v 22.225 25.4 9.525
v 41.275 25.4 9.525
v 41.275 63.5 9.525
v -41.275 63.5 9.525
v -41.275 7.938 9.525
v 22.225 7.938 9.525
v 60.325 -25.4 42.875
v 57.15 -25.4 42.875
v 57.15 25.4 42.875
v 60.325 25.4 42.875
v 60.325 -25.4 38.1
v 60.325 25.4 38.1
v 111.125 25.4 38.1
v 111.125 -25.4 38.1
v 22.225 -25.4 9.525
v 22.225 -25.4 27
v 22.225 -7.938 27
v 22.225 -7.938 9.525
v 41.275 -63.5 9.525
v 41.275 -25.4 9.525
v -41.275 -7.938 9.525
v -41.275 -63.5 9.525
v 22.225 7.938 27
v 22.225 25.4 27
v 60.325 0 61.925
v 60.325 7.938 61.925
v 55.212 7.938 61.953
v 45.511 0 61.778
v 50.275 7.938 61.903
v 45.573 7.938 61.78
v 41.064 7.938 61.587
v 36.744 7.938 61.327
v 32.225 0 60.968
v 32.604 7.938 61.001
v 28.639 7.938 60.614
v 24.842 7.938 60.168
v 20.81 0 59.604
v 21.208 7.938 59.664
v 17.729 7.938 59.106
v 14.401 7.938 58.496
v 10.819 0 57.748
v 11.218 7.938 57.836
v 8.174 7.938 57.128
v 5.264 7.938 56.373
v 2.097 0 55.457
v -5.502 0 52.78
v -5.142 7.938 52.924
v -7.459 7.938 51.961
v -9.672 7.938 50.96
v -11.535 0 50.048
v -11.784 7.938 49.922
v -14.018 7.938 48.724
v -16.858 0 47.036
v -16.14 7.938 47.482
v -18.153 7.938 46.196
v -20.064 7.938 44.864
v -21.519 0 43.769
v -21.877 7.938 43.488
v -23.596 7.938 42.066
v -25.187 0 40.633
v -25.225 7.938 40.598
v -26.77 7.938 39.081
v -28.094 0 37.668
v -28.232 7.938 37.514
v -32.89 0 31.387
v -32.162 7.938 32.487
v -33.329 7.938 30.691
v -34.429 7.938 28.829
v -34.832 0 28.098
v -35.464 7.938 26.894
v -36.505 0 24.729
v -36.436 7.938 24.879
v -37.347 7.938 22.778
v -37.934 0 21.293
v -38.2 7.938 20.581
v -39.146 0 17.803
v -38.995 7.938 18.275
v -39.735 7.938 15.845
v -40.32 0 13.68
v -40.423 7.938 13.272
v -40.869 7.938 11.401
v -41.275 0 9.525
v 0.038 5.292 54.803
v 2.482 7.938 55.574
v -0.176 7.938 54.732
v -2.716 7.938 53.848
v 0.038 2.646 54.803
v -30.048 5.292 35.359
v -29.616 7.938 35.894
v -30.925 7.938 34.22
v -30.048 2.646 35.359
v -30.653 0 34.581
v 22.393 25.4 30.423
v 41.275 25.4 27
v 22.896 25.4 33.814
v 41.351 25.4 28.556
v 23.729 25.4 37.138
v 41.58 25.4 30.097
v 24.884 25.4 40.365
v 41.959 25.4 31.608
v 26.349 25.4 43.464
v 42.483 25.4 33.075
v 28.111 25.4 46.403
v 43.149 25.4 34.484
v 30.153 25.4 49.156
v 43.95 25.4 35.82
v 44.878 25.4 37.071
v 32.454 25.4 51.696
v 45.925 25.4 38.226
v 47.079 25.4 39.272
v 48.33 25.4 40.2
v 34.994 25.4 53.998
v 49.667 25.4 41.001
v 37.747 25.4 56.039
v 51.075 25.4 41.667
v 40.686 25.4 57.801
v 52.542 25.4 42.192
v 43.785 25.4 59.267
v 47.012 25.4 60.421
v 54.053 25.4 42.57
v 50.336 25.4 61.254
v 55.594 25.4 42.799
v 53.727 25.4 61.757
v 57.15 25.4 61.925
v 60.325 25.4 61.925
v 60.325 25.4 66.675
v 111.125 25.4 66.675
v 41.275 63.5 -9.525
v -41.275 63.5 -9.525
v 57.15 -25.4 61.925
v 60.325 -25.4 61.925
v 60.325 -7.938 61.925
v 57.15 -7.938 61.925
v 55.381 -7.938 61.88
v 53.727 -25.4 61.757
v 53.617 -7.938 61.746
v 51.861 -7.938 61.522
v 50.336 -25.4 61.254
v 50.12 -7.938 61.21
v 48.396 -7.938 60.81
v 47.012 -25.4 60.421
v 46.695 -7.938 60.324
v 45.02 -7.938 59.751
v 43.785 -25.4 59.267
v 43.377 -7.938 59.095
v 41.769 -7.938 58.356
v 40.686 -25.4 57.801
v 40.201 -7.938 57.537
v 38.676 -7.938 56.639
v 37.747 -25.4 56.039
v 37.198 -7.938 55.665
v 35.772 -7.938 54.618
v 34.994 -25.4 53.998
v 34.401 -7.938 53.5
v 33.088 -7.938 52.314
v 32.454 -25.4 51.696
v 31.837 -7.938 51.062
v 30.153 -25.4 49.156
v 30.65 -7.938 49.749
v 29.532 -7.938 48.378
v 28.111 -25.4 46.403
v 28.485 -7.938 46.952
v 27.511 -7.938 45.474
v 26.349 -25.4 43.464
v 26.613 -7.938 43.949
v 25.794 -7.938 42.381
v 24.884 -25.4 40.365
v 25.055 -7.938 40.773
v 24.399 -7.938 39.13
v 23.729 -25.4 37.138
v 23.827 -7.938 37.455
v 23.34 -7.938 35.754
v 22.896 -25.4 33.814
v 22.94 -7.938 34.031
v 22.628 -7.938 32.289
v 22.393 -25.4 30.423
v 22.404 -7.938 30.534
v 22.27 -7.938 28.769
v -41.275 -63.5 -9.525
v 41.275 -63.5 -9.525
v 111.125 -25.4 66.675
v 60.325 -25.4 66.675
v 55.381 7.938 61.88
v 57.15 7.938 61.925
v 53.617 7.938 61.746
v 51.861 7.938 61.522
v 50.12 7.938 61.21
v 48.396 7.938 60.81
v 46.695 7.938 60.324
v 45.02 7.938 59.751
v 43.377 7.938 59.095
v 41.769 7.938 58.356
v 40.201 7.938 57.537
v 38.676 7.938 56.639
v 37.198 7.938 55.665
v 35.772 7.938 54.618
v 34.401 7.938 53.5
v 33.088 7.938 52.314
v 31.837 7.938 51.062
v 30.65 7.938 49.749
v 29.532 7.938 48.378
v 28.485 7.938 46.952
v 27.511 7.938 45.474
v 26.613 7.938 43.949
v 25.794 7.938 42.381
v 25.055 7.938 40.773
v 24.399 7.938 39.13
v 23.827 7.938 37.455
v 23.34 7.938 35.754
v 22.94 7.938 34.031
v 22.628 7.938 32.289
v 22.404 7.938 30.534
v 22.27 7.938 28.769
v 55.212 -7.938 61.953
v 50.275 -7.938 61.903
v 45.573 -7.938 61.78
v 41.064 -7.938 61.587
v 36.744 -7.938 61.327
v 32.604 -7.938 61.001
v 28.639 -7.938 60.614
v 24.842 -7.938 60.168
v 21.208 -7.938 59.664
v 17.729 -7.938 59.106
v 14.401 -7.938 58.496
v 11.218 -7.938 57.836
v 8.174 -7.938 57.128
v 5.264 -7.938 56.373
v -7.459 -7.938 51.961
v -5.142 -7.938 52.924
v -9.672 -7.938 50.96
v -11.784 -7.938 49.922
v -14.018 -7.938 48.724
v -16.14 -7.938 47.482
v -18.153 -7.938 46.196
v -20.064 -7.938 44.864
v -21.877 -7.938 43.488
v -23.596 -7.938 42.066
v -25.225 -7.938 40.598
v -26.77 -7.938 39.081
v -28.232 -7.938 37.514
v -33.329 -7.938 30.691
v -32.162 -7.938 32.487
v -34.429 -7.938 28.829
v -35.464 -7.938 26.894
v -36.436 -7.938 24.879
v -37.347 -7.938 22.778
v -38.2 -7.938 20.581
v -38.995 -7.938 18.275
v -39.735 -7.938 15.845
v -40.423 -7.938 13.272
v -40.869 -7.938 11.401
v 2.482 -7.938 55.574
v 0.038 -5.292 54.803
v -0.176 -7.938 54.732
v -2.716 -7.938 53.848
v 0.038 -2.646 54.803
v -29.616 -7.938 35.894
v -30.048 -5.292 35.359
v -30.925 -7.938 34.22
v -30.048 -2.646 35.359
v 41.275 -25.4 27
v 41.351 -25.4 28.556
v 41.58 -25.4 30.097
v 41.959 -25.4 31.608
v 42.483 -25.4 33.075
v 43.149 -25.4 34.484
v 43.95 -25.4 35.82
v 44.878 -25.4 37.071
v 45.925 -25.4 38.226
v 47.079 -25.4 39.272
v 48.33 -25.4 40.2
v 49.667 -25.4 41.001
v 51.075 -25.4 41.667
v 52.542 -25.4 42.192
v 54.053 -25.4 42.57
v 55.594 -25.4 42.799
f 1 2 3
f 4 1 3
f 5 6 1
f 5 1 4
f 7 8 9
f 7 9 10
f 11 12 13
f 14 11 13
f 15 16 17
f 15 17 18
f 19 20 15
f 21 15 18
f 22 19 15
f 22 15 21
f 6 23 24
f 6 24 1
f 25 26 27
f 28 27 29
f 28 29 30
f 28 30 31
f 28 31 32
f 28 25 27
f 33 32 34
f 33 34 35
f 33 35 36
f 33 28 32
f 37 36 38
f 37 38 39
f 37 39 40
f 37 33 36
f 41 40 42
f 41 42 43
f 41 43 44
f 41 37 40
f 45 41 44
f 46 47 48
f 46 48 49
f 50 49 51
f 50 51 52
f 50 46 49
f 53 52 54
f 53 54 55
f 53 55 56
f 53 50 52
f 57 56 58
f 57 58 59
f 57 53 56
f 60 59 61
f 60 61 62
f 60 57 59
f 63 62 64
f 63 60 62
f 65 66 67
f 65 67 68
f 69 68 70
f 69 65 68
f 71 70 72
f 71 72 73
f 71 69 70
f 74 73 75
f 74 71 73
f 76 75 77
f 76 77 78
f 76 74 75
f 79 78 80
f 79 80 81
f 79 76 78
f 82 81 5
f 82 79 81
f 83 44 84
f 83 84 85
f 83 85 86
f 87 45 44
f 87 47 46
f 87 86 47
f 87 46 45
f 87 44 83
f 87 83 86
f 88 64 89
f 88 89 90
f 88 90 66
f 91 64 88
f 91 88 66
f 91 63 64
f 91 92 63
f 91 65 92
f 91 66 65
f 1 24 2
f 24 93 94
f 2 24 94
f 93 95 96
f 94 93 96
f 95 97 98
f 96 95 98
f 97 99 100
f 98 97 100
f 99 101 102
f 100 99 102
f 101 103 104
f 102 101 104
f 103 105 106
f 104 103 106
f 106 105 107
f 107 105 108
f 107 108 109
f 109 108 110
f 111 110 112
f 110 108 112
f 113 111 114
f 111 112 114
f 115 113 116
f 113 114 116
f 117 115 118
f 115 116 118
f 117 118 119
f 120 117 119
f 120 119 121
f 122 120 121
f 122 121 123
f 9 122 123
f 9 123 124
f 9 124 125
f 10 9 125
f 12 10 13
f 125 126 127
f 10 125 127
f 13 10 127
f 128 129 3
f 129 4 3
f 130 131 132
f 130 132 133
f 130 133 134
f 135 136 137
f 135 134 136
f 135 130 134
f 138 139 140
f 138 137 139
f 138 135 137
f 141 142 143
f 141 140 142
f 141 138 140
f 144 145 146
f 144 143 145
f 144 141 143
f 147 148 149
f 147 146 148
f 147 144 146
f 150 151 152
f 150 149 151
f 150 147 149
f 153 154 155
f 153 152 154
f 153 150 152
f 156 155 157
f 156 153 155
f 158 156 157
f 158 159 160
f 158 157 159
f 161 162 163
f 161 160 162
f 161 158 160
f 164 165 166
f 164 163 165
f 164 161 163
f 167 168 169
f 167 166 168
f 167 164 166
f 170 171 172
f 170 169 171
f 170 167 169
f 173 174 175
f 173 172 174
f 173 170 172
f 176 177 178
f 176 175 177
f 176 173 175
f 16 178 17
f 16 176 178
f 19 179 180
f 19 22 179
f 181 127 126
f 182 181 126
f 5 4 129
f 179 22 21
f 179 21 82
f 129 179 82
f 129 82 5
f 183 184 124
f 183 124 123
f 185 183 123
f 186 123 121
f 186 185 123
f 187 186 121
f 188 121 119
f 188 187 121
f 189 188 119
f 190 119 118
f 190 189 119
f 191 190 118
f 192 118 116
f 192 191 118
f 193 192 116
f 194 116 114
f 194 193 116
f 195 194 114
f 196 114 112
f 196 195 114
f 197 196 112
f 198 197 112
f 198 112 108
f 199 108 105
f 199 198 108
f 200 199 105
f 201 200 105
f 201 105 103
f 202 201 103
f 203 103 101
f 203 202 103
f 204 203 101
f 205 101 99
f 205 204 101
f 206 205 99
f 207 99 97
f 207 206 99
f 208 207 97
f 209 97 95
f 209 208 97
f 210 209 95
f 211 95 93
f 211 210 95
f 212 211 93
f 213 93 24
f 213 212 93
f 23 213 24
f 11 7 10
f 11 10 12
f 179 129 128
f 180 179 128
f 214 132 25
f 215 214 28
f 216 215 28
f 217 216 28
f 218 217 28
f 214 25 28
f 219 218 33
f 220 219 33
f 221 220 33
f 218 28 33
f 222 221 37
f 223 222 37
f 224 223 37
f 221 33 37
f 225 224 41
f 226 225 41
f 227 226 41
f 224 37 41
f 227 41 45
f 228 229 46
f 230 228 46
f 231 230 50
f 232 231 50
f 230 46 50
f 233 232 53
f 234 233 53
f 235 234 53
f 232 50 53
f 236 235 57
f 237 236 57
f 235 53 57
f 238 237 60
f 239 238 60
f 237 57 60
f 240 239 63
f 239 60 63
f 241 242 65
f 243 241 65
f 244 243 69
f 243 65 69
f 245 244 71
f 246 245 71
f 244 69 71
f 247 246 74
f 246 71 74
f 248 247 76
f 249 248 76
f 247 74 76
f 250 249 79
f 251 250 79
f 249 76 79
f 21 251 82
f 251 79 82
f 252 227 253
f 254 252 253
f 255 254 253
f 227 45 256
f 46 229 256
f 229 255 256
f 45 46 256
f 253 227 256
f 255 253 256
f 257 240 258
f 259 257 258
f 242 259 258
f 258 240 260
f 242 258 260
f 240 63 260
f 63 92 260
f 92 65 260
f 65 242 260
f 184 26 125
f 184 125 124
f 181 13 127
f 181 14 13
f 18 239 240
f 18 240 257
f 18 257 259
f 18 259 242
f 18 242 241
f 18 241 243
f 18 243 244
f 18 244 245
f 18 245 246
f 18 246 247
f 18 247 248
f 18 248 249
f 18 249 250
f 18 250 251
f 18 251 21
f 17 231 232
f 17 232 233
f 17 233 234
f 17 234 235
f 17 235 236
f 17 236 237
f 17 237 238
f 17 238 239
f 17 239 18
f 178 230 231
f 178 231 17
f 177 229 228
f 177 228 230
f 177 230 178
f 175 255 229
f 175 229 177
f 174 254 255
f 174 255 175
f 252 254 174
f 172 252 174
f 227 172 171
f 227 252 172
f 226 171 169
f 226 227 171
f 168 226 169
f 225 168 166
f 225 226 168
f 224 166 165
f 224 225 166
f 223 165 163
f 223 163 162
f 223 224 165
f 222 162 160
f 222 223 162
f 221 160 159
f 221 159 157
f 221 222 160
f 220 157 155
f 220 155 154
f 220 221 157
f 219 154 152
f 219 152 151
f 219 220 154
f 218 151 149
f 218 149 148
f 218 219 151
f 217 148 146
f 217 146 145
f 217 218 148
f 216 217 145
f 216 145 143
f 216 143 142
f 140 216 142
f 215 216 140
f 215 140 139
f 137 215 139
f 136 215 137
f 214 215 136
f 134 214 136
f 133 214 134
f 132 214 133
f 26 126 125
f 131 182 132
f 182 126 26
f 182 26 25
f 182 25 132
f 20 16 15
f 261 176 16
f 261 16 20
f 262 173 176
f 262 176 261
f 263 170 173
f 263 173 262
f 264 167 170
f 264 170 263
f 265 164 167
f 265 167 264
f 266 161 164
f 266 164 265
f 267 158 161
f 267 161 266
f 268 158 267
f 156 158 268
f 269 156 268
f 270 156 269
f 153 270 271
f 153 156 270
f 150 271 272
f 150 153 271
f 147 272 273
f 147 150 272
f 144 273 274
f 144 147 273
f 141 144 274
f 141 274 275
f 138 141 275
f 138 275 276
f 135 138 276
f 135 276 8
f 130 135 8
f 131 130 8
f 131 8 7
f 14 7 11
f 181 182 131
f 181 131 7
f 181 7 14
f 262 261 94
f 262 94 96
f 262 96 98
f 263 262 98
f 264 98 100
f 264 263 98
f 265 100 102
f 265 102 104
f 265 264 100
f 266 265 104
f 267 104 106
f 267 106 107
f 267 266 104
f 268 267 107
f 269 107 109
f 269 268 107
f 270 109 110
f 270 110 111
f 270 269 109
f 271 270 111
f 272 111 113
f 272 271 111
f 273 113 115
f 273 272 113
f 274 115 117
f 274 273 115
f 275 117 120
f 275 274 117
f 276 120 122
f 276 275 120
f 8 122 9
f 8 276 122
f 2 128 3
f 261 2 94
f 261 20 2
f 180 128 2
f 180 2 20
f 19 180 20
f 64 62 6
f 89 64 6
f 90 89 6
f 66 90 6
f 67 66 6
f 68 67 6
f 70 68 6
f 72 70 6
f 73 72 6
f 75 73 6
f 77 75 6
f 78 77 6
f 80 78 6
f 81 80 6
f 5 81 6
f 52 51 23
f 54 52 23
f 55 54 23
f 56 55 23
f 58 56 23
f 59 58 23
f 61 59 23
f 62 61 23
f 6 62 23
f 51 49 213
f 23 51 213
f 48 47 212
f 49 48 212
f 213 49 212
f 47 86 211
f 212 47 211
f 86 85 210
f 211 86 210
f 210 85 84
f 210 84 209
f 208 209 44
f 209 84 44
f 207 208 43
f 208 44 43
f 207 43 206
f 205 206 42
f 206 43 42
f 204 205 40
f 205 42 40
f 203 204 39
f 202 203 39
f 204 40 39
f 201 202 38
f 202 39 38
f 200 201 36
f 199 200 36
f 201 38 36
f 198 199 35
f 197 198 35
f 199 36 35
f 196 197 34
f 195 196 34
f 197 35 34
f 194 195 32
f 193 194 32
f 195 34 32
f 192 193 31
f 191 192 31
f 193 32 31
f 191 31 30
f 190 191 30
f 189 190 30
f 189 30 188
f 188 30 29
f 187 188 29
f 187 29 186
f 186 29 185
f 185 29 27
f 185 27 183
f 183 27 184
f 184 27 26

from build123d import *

# Parameters (mm, degrees)
F1_DEPTH = 63.5
F0_W     = 25.4
F0_H     = 28.575
F2_DEPTH = 25.4
F3_DEPTH = 7.9375


# Not quite as in the source:
# - a feature of the source that left no trace in its solid (it failed there, or was rolled back) is left out


with BuildPart() as f1:
    # F0 (on Front) → F1 (new body, symmetric)
    with BuildSketch(Plane.XZ):
        Polygon((-41.275, -9.525), (41.275, -9.525), (41.275, 9.525), (22.225, 9.525), (-41.275, 9.525), align=None)
    extrude(amount=F1_DEPTH, both=True)

    # F0 (on Front) → F2 (join, symmetric)
    with BuildSketch(Plane.XZ):
        Polygon((60.325, 66.675), (60.325, 61.9252), (60.325, 42.8752), (60.325, 38.1), (85.725, 38.1), (85.725, 66.675), align=None)
        with BuildLine():
            Line((22.225, 9.525), (41.275, 9.525))
            Line((41.275, 9.525), (41.275, 27.0002))
            ThreePointArc((41.275, 27.0002), (45.9246798487, 38.2255201513), (57.15, 42.8752))
            Line((57.15, 42.8752), (60.325, 42.8752))
            Line((60.325, 42.8752), (60.325, 61.9252))
            Line((60.325, 61.9252), (57.15, 61.9252))
            ThreePointArc((57.15, 61.9252), (32.4542956671, 51.6959043329), (22.225, 27.0002))
            Line((22.225, 27.0002), (22.225, 9.525))
        make_face()
        with Locations((98.425, 52.3875)):
            Rectangle(F0_W, F0_H)
    extrude(amount=F2_DEPTH, both=True)

    # F0 (on Front) → F3 (join, symmetric)
    with BuildSketch(Plane.XZ):
        with BuildLine():
            add(Edge.make_bspline(
                [(60.325, 61.9252), (-18.8444089144, 62.9406571388), (-35.6957179924, 36.5767096935), (-41.275, 9.525)],
                knots=[0, 0, 0, 0, 114.3168446032, 114.3168446032, 114.3168446032, 114.3168446032], degree=3))
            Line((-41.275, 9.525), (22.225, 9.525))
            Line((22.225, 9.525), (22.225, 27.0002))
            ThreePointArc((22.225, 27.0002), (32.4542956671, 51.6959043329), (57.15, 61.9252))
            Line((57.15, 61.9252), (60.325, 61.9252))
        make_face()
    extrude(amount=F3_DEPTH, both=True)


solid = f1.part
